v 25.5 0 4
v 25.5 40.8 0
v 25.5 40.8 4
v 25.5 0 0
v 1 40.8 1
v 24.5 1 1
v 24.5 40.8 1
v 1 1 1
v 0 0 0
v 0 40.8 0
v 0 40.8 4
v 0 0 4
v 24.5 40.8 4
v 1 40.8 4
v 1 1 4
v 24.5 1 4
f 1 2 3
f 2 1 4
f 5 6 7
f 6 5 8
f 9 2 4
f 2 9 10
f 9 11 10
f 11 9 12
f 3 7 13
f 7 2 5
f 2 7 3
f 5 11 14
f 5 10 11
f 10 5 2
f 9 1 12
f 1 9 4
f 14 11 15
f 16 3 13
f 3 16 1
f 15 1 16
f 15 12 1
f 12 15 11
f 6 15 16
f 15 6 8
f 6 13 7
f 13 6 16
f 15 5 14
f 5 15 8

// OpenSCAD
$fn=100;

base_width_x = 24.5;
base_length_y = 39.8; // covers up to 6
//base_length_y = 26.8; // covers up to 4, OK
//base_length_y = 13.8; // covers up to 2, OK
base_z = 1;

walls = 1;
height = 4;

module tapita();
{
    union()
    {
    
        cube([base_width_x+walls, base_length_y+walls, base_z]);
        
        translate([0, 0, 0])
        {
            cube([base_width_x + walls, walls, height]);
        }
        
        translate([base_width_x, 0, 0])
        {
            cube([walls, base_length_y + walls, height]);
        }
        
        translate([0, 0, 0])
        {
            cube([walls, base_length_y + walls, height]);
        }
        
    }
}
